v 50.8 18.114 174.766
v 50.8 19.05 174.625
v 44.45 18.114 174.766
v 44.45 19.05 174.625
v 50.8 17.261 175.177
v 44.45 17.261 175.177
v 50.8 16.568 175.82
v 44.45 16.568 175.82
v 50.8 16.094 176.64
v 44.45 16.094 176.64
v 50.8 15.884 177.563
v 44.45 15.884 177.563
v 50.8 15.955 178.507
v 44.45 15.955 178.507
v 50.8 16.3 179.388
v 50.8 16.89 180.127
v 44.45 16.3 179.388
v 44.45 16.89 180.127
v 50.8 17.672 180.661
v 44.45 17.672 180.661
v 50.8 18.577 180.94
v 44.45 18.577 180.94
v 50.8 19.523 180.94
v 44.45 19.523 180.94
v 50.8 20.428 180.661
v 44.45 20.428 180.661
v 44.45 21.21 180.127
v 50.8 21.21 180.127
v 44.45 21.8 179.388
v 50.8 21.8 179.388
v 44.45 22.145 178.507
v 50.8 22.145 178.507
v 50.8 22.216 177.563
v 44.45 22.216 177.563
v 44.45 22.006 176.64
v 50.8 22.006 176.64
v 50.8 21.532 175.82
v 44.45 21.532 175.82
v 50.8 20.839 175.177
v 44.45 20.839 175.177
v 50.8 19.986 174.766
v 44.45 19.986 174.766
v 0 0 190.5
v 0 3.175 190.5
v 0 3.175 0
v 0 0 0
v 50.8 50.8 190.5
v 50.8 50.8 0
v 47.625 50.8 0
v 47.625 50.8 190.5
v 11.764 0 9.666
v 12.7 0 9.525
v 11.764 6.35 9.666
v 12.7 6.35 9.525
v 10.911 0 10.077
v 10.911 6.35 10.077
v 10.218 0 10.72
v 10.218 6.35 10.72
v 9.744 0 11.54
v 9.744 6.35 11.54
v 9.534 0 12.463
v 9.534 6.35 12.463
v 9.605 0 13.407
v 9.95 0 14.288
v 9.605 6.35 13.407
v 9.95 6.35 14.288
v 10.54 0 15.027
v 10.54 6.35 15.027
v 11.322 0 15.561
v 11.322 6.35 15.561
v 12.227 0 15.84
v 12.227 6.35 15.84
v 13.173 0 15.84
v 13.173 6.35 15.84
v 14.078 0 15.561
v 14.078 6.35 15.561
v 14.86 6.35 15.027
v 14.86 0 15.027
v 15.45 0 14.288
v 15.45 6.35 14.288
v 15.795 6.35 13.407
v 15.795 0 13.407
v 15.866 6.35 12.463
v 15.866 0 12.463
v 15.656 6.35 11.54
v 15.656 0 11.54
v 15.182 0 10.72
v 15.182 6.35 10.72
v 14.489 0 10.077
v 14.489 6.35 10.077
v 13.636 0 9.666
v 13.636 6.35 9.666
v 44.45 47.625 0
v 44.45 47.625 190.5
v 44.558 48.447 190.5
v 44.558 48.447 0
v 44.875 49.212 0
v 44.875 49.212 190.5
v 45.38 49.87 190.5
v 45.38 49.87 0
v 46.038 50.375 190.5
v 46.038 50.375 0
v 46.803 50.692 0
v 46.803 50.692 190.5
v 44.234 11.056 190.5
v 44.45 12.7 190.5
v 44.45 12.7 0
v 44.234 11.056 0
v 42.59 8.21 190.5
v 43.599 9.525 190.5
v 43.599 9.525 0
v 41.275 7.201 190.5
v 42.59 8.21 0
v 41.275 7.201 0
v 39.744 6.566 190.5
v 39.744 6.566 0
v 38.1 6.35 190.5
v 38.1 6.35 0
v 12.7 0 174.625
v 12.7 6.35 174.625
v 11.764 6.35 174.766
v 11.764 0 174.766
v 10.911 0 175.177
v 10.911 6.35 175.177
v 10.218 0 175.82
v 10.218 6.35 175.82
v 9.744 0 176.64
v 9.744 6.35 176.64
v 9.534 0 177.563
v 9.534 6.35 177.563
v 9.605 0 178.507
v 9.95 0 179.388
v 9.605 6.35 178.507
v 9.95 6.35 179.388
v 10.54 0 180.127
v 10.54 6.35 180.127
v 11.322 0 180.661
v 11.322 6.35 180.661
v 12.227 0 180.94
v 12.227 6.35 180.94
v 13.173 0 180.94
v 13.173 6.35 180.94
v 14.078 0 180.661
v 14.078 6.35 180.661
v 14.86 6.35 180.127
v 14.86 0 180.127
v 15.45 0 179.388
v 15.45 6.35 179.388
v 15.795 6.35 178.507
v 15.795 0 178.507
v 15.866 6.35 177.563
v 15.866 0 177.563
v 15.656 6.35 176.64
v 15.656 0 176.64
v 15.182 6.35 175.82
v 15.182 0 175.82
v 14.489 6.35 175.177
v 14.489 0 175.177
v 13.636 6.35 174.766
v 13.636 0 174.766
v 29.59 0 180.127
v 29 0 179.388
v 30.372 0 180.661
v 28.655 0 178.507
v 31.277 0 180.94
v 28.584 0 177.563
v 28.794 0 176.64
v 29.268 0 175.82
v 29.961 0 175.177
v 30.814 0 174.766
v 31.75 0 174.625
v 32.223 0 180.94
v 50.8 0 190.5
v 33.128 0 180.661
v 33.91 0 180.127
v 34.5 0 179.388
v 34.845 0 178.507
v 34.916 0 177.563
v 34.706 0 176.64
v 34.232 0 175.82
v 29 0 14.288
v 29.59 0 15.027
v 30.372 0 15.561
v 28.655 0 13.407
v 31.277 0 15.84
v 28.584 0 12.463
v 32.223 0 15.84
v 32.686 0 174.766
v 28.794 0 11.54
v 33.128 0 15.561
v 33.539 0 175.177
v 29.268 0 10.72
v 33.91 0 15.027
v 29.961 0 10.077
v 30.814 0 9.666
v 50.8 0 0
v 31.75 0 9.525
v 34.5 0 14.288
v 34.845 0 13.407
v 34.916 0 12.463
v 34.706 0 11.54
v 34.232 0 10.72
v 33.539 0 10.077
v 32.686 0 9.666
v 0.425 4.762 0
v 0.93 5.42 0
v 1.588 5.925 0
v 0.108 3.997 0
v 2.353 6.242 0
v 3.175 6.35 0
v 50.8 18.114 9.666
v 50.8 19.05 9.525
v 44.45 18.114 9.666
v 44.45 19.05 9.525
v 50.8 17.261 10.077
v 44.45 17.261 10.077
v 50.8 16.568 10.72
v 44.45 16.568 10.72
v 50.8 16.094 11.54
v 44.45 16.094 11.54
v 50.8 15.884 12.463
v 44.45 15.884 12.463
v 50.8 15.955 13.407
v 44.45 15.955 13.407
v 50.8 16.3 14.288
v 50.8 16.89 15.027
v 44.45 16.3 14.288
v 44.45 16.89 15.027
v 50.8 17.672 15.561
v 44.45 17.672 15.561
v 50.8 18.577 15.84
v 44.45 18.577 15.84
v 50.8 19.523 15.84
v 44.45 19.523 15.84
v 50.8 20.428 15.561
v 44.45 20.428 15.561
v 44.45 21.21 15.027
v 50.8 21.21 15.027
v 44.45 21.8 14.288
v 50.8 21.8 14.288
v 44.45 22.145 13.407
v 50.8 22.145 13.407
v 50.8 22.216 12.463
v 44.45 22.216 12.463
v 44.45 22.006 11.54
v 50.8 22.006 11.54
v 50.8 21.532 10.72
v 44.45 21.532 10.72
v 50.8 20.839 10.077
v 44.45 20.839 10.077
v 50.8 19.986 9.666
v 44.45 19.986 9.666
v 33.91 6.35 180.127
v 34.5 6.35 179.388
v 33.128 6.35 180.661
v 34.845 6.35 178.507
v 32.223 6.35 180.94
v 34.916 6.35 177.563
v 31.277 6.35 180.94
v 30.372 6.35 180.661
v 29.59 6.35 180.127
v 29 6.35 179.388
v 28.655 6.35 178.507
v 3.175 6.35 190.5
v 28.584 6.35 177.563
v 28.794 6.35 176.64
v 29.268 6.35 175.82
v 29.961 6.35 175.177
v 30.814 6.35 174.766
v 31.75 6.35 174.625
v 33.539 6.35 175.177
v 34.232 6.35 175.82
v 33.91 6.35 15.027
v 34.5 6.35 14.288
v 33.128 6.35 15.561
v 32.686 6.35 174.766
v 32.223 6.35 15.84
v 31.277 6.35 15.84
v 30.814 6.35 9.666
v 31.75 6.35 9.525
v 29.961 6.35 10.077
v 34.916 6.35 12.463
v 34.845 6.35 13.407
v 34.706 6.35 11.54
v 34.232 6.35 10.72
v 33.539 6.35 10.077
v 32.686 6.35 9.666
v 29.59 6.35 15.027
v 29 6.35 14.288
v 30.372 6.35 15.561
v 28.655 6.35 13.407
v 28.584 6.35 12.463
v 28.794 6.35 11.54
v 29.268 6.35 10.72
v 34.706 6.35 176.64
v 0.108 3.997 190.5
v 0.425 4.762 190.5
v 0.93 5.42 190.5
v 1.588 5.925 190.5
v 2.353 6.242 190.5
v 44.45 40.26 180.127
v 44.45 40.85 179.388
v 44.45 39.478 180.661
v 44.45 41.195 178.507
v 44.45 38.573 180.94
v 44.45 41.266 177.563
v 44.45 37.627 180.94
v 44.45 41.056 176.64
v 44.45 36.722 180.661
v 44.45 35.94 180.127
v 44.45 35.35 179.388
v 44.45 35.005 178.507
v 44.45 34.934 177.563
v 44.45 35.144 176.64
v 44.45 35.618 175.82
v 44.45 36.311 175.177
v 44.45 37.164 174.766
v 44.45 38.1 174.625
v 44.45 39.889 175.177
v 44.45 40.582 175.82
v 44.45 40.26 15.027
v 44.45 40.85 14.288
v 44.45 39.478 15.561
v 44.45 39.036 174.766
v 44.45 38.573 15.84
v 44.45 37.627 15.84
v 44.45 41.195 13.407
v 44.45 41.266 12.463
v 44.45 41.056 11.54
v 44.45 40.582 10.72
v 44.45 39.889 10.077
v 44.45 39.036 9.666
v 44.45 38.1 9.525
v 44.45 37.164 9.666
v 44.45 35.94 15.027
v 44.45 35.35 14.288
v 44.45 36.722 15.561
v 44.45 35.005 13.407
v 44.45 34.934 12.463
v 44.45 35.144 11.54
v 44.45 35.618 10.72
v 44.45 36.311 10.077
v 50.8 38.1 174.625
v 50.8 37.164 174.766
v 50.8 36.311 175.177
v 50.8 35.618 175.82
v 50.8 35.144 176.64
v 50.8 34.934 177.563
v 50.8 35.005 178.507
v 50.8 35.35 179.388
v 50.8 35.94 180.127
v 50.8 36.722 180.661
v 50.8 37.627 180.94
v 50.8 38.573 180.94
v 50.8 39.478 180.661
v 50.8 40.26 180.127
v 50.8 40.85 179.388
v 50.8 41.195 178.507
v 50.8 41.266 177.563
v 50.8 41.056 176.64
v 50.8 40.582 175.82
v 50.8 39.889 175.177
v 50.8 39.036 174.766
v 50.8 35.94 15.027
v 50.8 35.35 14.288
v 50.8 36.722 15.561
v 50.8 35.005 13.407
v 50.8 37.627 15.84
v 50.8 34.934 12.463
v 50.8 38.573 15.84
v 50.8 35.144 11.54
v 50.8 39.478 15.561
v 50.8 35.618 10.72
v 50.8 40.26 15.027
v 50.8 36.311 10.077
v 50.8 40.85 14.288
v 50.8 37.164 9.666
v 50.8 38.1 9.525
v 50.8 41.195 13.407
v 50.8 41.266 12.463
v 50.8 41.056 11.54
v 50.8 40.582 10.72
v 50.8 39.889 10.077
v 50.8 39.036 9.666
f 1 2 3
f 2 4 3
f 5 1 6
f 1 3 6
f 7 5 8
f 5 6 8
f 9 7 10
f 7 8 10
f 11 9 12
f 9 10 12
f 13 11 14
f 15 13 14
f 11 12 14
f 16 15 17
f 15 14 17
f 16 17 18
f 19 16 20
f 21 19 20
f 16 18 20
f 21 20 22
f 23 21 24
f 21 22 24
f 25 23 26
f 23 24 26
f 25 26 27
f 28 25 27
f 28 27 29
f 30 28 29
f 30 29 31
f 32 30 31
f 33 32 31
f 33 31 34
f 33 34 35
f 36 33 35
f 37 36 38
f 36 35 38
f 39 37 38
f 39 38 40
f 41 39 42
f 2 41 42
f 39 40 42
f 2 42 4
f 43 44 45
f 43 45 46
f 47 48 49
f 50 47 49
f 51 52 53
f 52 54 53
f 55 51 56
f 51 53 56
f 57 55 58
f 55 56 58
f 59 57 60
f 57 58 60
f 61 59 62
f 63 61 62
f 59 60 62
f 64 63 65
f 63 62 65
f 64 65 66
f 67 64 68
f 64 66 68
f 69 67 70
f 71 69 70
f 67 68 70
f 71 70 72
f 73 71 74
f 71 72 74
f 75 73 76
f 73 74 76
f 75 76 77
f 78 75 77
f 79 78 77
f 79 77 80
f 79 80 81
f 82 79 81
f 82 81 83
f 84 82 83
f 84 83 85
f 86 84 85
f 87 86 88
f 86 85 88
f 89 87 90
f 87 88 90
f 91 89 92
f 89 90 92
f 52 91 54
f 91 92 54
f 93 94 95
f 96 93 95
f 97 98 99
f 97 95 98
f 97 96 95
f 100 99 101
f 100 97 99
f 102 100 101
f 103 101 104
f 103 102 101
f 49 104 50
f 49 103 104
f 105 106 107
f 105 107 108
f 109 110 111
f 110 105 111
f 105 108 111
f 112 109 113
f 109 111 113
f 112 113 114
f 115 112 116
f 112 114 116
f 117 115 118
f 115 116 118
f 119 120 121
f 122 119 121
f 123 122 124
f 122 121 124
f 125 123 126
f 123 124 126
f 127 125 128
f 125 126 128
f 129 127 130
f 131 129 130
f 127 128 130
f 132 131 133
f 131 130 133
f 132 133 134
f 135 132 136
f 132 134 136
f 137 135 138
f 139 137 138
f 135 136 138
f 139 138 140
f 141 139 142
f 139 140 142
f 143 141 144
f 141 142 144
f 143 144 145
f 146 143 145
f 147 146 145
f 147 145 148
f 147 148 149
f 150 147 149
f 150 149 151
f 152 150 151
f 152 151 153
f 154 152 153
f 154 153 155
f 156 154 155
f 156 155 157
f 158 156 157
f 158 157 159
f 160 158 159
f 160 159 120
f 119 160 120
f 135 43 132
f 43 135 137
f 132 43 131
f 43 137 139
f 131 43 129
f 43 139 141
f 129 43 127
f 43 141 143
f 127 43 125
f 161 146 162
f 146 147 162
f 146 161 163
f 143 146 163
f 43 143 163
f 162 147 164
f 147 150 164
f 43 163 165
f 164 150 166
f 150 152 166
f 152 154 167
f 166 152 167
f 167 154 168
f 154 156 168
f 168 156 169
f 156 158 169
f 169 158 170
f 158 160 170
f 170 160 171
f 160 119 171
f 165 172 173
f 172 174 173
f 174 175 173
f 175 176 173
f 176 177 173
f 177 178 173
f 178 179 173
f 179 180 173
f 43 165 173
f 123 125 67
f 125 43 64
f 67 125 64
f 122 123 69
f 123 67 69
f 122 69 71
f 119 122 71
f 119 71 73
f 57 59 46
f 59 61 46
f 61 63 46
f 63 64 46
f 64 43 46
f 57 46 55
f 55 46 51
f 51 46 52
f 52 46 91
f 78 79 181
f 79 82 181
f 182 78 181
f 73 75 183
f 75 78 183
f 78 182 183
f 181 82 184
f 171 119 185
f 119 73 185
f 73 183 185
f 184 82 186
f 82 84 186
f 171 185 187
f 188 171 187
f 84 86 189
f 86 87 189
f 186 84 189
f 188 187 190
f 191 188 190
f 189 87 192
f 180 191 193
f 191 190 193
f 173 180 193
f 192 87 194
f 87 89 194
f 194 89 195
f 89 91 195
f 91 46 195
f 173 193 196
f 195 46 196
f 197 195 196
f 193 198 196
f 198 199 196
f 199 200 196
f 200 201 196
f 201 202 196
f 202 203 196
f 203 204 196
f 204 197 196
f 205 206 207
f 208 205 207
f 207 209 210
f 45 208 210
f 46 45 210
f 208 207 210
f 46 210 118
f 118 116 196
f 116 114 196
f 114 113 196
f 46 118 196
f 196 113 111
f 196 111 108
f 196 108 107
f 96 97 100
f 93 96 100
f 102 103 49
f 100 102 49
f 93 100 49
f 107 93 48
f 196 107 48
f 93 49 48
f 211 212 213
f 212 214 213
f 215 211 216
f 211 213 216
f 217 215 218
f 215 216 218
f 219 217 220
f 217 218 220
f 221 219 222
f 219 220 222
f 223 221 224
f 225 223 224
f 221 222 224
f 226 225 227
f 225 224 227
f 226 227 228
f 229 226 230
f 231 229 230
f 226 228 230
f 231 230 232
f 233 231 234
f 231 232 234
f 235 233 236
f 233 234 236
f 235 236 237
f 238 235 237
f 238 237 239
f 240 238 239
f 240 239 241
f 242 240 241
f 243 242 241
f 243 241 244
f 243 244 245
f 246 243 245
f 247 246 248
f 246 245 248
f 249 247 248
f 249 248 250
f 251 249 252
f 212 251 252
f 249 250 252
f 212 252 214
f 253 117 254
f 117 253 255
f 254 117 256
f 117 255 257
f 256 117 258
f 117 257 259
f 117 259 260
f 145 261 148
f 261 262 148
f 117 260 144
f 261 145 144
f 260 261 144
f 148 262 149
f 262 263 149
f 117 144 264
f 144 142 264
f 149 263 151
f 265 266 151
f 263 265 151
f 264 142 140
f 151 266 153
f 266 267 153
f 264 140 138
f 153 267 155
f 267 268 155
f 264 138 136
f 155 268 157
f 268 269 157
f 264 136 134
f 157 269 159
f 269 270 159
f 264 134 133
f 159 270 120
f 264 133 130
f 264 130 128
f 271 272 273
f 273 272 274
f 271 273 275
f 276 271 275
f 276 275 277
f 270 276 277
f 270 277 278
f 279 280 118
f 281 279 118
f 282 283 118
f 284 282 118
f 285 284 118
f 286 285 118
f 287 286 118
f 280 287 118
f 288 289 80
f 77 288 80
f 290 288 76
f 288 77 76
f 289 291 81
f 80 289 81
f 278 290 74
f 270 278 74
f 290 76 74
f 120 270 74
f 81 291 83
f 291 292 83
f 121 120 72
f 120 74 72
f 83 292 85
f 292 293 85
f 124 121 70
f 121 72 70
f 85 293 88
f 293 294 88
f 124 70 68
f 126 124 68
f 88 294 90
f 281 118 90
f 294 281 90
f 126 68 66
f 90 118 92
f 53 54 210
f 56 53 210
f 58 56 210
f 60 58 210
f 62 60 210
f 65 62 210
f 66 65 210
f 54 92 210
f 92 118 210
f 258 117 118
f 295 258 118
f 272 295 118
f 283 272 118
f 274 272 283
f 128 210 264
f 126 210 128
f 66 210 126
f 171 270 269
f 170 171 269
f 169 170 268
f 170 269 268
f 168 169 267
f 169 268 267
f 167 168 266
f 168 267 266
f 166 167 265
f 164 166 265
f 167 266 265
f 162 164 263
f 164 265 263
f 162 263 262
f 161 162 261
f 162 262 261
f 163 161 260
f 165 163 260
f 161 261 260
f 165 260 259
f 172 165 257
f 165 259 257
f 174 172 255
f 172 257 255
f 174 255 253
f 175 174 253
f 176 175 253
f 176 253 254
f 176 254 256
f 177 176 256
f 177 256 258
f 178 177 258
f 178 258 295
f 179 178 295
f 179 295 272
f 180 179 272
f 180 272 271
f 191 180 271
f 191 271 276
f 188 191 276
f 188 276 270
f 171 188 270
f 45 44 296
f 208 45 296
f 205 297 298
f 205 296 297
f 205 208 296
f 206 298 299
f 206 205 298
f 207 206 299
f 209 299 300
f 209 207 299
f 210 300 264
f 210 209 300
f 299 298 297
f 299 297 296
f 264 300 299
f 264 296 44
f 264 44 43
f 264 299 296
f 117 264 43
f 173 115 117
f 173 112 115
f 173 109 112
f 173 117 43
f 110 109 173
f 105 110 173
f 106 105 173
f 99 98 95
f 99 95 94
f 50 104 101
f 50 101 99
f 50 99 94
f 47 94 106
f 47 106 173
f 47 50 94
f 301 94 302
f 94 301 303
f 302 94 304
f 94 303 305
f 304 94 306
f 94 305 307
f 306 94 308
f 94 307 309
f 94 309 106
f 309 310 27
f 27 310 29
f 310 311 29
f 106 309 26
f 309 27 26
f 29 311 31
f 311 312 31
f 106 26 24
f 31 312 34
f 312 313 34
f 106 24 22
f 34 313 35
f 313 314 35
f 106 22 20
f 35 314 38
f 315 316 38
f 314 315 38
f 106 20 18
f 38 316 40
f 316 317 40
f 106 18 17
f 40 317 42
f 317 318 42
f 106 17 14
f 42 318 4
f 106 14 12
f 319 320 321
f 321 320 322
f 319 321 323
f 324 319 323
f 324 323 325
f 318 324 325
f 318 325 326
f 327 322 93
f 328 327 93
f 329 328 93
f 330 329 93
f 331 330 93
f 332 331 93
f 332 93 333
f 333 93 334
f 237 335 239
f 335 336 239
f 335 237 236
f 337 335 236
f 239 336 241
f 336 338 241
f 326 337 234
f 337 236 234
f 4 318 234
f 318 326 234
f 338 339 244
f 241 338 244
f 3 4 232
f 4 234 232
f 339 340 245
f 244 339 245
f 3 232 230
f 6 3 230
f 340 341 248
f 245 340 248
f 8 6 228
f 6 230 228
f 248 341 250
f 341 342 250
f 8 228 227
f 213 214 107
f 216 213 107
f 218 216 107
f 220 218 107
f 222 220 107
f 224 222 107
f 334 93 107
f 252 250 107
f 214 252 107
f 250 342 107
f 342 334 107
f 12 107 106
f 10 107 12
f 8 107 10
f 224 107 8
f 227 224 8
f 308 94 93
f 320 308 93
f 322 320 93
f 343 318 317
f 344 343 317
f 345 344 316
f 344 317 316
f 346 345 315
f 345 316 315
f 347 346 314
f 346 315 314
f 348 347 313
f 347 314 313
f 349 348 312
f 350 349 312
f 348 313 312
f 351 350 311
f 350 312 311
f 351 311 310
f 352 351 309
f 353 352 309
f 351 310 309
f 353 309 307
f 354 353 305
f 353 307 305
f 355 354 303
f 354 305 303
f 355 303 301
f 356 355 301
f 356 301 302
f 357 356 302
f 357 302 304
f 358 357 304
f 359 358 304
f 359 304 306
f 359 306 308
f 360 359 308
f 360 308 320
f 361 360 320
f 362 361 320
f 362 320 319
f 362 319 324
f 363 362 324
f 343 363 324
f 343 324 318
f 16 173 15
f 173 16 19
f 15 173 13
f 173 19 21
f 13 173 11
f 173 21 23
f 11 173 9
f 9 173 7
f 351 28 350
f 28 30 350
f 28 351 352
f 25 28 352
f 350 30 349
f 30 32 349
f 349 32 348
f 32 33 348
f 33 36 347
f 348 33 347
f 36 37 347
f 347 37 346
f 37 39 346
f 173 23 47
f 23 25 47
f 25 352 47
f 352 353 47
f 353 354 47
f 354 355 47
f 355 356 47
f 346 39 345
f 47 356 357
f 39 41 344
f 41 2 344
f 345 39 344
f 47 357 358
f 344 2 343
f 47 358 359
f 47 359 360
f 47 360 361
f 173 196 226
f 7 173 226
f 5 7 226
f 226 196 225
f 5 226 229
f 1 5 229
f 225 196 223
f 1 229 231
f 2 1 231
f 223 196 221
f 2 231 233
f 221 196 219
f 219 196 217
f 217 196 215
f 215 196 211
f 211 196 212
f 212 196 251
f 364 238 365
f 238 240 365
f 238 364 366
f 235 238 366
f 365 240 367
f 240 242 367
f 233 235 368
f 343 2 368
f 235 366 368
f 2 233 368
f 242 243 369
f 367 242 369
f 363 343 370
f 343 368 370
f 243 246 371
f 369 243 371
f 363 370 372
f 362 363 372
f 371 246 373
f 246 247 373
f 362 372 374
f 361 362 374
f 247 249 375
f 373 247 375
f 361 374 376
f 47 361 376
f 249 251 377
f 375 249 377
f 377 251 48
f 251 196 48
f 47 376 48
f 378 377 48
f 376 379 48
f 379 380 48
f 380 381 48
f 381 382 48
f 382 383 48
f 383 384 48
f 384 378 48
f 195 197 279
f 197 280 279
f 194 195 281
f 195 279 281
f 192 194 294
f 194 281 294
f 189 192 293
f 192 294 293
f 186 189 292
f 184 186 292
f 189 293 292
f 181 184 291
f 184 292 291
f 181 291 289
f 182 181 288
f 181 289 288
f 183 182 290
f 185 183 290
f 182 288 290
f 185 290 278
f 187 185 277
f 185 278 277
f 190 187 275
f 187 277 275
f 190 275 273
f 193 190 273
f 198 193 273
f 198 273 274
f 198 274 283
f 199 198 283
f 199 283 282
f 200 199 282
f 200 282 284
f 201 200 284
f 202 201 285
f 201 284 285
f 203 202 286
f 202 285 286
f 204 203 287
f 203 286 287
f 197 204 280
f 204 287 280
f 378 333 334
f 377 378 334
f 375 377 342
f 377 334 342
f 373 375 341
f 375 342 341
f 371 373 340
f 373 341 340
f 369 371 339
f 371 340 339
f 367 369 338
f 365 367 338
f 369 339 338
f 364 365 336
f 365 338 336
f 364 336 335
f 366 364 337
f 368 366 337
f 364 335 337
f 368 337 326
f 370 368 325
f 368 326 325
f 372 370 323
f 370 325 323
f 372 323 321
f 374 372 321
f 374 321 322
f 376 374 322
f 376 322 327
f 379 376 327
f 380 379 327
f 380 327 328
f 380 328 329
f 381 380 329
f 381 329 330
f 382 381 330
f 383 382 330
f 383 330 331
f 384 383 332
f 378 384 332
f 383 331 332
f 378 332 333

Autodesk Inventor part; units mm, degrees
ref_plane "YZ Plane" through (0, 0, 0) normal (1, 0, 0) x (0, 1, 0)
ref_plane "XZ Plane" through (0, 0, 0) normal (0, 1, 0) x (-1, 0, 0)
ref_plane "XY Plane" through (0, 0, 0) normal (0, 0, 1) x (1, 0, 0)
sketch "Sketch1" plane through (0, 0, 0) normal (0, 0, 1) x (1, 0, 0)
  line L0 (0, 0) -> (50.8, 0)
  line L1 (50.8, 0) -> (50.8, 50.8)
  line L2 (50.8, 50.8) -> (47.625, 50.8)
  line L3 (44.45, 47.625) -> (44.45, 12.7)
  line L4 (38.1, 6.35) -> (3.175, 6.35)
  line L5 (0, 3.175) -> (0, 0)
  arc A0 (3.175, 6.35) -> (0, 3.175) centre (3.175, 3.175) ccw
  arc A1 (47.625, 50.8) -> (44.45, 47.625) centre (47.625, 47.625) ccw
  arc A2 (38.1, 6.35) -> (44.45, 12.7) centre (38.1, 12.7) ccw
  dimension "d0" = 50.8
  dimension "d1" = 6.35
  dimension "d2" = 3.175
  dimension "d3" = 6.35
extrude "Extrusion1" add sketch "Sketch1" along normal blind 190.5
sketch "Sketch2" plane through (0, 0, 0) normal (0, -1, 0) x (1, 0, 0)
  line L0 (0, 0) -> (50.8, 0) projected
  line L1 (0, 190.5) -> (50.8, 190.5) projected
  line L2 (0, 0) -> (0, 190.5) projected
  point P0 (12.7, 177.8)
  point P1 (31.75, 177.8)
  point P2 (12.7, 12.7)
  point P3 (31.75, 12.7)
  dimension "d6" = 19.05
  dimension "d7" = 12.7
  dimension "d8" = 12.7
  dimension "d9" = 12.7
hole "Hole1" at (12.7, 0, 177.8) at (31.75, 0, 177.8) at (12.7, 0, 12.7) at (31.75, 0, 12.7) direction (0, 1, 0) diameter 6.35 end through all
sketch "Sketch3" plane through (50.8, 0, 0) normal (1, 0, 0) x (0, 0, -1)
  line L0 (0, 0) -> (0, 50.8) projected
  line L1 (0, 50.8) -> (-190.5, 50.8) projected
  line L2 (-190.5, 0) -> (-190.5, 50.8) projected
  point P0 (-177.8, 19.05)
  point P1 (-177.8, 38.1)
  point P2 (-12.7, 19.05)
  point P3 (-12.7, 38.1)
  dimension "d17" = 19.05
  dimension "d18" = 12.7
  dimension "d19" = 12.7
  dimension "d20" = 12.7
hole "Hole2" at (50.8, 19.05, 177.8) at (50.8, 38.1, 177.8) at (50.8, 19.05, 12.7) at (50.8, 38.1, 12.7) direction (-1, 0, 0) diameter 6.35 end through all
properties part number "Right Angle" material "Aluminum 6061"
